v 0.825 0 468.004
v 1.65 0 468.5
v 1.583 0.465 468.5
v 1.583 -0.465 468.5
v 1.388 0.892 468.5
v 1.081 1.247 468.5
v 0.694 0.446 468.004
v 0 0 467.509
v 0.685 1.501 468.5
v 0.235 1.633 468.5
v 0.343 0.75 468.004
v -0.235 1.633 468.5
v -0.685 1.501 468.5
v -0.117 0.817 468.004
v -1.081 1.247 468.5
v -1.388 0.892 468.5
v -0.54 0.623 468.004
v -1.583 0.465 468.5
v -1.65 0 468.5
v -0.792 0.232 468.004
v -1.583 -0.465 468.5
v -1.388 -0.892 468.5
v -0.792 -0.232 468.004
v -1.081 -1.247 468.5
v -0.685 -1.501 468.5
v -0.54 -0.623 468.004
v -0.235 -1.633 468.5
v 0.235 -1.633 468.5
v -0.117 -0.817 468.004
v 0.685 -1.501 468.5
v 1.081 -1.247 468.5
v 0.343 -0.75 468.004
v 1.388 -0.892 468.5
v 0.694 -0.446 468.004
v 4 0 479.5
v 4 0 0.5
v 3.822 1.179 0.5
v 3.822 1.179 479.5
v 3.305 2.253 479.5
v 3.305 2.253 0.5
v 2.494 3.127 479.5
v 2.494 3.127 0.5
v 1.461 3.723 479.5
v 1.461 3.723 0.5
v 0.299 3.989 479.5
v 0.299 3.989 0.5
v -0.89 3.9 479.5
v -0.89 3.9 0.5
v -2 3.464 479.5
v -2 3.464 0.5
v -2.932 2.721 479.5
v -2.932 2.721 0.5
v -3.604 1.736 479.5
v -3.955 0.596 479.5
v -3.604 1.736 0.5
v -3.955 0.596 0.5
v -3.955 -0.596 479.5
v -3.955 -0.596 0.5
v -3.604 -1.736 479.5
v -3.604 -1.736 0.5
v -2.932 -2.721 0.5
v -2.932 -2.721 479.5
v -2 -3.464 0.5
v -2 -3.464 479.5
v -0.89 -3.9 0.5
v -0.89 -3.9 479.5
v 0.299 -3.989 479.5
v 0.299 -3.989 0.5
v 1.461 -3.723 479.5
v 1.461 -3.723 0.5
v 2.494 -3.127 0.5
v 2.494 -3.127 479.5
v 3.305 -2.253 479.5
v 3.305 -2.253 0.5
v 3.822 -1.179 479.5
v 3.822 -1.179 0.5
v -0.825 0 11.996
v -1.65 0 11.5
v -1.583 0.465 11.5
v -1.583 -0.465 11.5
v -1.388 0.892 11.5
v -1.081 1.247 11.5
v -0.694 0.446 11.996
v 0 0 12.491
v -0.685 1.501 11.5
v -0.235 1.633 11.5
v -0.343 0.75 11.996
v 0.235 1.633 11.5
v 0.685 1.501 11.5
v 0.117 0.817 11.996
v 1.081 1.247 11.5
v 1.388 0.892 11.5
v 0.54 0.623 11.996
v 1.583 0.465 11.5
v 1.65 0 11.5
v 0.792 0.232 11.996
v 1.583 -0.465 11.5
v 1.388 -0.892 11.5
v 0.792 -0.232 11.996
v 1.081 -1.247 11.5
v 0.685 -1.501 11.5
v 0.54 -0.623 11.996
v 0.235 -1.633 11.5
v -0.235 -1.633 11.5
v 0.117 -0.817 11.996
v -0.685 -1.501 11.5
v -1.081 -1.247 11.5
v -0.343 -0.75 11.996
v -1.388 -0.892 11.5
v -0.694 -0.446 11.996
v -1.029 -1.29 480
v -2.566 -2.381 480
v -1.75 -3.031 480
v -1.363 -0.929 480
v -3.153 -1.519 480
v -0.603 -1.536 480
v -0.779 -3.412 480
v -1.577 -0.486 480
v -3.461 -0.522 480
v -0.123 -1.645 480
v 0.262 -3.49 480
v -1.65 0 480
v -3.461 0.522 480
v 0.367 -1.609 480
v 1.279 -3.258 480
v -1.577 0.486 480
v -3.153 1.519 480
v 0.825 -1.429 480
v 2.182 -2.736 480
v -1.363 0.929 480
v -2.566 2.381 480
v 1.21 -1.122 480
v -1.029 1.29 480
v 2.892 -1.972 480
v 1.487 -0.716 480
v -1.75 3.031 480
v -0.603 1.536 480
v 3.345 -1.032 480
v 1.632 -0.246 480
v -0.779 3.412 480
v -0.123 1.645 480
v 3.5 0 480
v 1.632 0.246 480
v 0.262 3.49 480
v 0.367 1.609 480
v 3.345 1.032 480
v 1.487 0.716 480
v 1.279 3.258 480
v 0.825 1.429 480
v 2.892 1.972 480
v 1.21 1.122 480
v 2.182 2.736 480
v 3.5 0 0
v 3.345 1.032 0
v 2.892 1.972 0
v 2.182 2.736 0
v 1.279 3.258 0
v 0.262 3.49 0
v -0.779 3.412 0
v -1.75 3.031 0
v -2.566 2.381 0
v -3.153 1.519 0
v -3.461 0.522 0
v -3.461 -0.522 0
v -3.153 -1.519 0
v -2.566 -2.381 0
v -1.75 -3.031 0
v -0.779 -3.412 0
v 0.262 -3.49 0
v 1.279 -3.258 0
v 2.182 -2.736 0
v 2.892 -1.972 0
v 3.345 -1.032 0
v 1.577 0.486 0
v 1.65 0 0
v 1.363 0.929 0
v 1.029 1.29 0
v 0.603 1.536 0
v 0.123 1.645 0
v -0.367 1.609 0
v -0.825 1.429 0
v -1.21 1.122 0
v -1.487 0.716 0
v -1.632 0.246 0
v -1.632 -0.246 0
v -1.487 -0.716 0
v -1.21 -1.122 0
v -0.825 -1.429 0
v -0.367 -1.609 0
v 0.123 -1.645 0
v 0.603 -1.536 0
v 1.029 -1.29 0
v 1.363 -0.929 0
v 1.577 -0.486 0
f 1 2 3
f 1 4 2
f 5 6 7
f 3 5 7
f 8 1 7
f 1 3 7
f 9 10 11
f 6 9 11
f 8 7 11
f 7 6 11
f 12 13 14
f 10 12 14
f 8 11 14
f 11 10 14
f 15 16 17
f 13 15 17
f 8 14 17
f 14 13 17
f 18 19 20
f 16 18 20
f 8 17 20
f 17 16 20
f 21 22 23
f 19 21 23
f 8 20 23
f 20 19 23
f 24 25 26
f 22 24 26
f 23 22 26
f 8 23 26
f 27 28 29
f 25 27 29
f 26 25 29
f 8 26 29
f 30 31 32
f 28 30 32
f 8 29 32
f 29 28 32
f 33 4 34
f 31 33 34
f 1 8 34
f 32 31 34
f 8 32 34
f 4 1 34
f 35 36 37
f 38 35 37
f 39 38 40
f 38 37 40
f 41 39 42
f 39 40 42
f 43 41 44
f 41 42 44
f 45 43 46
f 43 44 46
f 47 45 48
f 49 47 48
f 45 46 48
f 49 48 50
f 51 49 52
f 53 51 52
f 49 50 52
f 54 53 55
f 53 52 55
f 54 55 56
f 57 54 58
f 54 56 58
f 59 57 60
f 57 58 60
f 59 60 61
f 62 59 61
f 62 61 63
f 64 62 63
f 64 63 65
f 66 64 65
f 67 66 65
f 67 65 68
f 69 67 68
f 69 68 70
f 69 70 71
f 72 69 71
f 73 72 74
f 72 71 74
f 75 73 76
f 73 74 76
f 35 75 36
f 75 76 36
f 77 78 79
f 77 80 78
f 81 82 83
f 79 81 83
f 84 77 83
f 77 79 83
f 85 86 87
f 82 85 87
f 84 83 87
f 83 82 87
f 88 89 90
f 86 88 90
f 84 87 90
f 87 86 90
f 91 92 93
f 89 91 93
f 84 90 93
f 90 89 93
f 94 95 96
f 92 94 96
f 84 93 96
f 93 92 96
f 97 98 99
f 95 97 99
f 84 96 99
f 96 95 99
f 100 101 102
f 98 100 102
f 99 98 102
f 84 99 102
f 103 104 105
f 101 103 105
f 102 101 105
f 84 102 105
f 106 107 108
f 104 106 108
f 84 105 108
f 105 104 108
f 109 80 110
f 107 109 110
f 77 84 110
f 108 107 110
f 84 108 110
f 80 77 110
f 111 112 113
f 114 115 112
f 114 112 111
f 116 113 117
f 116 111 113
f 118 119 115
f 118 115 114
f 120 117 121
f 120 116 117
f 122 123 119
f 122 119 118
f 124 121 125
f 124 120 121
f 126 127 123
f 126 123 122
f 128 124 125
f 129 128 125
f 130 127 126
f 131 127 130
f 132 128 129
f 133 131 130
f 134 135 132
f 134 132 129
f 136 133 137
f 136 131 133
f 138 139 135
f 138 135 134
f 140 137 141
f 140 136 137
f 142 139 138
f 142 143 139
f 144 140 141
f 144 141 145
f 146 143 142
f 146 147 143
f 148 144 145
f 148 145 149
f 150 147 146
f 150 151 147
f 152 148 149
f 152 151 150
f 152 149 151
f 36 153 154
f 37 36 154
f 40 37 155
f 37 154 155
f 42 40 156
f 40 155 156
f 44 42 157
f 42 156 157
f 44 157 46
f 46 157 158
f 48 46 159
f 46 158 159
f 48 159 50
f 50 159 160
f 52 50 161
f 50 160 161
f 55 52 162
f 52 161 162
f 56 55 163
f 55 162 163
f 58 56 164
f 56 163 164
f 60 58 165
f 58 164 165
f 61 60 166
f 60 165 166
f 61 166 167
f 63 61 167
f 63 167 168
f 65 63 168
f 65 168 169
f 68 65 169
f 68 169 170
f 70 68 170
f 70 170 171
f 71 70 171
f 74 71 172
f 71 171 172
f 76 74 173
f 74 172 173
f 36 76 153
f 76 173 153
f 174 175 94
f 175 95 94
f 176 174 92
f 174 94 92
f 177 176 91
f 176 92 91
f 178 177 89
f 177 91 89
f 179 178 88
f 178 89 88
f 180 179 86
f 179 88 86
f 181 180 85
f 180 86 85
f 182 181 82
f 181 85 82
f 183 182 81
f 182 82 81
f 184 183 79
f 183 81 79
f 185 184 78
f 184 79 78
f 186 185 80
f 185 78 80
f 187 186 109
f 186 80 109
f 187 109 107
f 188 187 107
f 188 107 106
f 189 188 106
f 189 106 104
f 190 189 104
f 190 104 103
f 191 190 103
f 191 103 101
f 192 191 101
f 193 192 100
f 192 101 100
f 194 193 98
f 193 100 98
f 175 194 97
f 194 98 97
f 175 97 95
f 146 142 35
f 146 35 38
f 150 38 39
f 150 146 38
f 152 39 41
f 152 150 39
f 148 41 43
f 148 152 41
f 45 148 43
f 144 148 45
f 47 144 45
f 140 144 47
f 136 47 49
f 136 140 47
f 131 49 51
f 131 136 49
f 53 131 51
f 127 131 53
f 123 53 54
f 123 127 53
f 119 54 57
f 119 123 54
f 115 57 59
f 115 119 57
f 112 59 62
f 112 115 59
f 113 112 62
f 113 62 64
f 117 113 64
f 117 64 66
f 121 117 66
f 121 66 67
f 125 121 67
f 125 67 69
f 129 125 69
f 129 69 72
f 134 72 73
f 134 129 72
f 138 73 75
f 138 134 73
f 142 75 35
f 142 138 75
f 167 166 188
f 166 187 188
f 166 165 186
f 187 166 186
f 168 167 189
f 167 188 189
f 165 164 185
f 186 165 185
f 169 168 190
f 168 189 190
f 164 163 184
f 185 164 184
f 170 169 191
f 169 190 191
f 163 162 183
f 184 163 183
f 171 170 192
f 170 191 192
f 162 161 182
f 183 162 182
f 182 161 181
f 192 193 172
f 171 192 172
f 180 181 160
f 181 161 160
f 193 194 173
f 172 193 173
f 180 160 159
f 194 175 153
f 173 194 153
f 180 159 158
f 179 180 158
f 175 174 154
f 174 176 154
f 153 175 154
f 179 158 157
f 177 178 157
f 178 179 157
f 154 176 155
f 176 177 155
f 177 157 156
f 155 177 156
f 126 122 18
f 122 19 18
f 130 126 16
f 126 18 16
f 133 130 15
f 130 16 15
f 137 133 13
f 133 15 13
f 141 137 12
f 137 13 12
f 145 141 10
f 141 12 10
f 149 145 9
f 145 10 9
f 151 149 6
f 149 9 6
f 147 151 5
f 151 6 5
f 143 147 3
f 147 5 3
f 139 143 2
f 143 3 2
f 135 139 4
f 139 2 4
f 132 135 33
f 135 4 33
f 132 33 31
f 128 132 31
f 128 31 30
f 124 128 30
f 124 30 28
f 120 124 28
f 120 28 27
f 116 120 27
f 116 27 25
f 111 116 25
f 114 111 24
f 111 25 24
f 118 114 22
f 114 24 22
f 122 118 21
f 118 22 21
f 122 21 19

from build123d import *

# Parameters (mm, degrees)
ESQUISSE1_R           = 4
BOSS_EXTRU_1_DEPTH    = 480
CHANFREIN1_SIZE       = 0.5
TROU_TARAUD_M41_D     = 3.3
TROU_TARAUD_M41_DEPTH = 11.5
TROU_TARAUD_M41_TIP   = 0.991420021
TROU_TARAUD_M42_D     = 3.3
TROU_TARAUD_M42_DEPTH = 11.5
TROU_TARAUD_M42_TIP   = 0.991420021


with BuildPart() as part:
    # Esquisse1 → Boss.-Extru.1 (new body)
    with BuildSketch(Plane.XY):
        Circle(ESQUISSE1_R)
    extrude(amount=BOSS_EXTRU_1_DEPTH)

    # Chanfrein1
    chanfrein1_edges = [part.edges().sort_by_distance(p)[0] for p in [
        (-4, 0, 0),
        (-4, 0, 480),
    ]]
    chamfer(chanfrein1_edges, length=CHANFREIN1_SIZE)

    # Trou taraudé M41
    with Locations(Plane.XY.offset(480)):
        with Locations((0, 0)):
            Hole(TROU_TARAUD_M41_D / 2, depth=TROU_TARAUD_M41_DEPTH)
            with Locations((0, 0, -(TROU_TARAUD_M41_DEPTH + TROU_TARAUD_M41_TIP / 2))):  # 118° drill point
                Cone(0, TROU_TARAUD_M41_D / 2, TROU_TARAUD_M41_TIP, mode=Mode.SUBTRACT)

    # Trou taraudé M42
    with Locations(Plane(origin=(0, 0, 0), x_dir=(-1, 0, 0), z_dir=(0, 0, -1))):
        with Locations((0, 0)):
            Hole(TROU_TARAUD_M42_D / 2, depth=TROU_TARAUD_M42_DEPTH)
            with Locations((0, 0, -(TROU_TARAUD_M42_DEPTH + TROU_TARAUD_M42_TIP / 2))):  # 118° drill point
                Cone(0, TROU_TARAUD_M42_D / 2, TROU_TARAUD_M42_TIP, mode=Mode.SUBTRACT)


solid = part.part
